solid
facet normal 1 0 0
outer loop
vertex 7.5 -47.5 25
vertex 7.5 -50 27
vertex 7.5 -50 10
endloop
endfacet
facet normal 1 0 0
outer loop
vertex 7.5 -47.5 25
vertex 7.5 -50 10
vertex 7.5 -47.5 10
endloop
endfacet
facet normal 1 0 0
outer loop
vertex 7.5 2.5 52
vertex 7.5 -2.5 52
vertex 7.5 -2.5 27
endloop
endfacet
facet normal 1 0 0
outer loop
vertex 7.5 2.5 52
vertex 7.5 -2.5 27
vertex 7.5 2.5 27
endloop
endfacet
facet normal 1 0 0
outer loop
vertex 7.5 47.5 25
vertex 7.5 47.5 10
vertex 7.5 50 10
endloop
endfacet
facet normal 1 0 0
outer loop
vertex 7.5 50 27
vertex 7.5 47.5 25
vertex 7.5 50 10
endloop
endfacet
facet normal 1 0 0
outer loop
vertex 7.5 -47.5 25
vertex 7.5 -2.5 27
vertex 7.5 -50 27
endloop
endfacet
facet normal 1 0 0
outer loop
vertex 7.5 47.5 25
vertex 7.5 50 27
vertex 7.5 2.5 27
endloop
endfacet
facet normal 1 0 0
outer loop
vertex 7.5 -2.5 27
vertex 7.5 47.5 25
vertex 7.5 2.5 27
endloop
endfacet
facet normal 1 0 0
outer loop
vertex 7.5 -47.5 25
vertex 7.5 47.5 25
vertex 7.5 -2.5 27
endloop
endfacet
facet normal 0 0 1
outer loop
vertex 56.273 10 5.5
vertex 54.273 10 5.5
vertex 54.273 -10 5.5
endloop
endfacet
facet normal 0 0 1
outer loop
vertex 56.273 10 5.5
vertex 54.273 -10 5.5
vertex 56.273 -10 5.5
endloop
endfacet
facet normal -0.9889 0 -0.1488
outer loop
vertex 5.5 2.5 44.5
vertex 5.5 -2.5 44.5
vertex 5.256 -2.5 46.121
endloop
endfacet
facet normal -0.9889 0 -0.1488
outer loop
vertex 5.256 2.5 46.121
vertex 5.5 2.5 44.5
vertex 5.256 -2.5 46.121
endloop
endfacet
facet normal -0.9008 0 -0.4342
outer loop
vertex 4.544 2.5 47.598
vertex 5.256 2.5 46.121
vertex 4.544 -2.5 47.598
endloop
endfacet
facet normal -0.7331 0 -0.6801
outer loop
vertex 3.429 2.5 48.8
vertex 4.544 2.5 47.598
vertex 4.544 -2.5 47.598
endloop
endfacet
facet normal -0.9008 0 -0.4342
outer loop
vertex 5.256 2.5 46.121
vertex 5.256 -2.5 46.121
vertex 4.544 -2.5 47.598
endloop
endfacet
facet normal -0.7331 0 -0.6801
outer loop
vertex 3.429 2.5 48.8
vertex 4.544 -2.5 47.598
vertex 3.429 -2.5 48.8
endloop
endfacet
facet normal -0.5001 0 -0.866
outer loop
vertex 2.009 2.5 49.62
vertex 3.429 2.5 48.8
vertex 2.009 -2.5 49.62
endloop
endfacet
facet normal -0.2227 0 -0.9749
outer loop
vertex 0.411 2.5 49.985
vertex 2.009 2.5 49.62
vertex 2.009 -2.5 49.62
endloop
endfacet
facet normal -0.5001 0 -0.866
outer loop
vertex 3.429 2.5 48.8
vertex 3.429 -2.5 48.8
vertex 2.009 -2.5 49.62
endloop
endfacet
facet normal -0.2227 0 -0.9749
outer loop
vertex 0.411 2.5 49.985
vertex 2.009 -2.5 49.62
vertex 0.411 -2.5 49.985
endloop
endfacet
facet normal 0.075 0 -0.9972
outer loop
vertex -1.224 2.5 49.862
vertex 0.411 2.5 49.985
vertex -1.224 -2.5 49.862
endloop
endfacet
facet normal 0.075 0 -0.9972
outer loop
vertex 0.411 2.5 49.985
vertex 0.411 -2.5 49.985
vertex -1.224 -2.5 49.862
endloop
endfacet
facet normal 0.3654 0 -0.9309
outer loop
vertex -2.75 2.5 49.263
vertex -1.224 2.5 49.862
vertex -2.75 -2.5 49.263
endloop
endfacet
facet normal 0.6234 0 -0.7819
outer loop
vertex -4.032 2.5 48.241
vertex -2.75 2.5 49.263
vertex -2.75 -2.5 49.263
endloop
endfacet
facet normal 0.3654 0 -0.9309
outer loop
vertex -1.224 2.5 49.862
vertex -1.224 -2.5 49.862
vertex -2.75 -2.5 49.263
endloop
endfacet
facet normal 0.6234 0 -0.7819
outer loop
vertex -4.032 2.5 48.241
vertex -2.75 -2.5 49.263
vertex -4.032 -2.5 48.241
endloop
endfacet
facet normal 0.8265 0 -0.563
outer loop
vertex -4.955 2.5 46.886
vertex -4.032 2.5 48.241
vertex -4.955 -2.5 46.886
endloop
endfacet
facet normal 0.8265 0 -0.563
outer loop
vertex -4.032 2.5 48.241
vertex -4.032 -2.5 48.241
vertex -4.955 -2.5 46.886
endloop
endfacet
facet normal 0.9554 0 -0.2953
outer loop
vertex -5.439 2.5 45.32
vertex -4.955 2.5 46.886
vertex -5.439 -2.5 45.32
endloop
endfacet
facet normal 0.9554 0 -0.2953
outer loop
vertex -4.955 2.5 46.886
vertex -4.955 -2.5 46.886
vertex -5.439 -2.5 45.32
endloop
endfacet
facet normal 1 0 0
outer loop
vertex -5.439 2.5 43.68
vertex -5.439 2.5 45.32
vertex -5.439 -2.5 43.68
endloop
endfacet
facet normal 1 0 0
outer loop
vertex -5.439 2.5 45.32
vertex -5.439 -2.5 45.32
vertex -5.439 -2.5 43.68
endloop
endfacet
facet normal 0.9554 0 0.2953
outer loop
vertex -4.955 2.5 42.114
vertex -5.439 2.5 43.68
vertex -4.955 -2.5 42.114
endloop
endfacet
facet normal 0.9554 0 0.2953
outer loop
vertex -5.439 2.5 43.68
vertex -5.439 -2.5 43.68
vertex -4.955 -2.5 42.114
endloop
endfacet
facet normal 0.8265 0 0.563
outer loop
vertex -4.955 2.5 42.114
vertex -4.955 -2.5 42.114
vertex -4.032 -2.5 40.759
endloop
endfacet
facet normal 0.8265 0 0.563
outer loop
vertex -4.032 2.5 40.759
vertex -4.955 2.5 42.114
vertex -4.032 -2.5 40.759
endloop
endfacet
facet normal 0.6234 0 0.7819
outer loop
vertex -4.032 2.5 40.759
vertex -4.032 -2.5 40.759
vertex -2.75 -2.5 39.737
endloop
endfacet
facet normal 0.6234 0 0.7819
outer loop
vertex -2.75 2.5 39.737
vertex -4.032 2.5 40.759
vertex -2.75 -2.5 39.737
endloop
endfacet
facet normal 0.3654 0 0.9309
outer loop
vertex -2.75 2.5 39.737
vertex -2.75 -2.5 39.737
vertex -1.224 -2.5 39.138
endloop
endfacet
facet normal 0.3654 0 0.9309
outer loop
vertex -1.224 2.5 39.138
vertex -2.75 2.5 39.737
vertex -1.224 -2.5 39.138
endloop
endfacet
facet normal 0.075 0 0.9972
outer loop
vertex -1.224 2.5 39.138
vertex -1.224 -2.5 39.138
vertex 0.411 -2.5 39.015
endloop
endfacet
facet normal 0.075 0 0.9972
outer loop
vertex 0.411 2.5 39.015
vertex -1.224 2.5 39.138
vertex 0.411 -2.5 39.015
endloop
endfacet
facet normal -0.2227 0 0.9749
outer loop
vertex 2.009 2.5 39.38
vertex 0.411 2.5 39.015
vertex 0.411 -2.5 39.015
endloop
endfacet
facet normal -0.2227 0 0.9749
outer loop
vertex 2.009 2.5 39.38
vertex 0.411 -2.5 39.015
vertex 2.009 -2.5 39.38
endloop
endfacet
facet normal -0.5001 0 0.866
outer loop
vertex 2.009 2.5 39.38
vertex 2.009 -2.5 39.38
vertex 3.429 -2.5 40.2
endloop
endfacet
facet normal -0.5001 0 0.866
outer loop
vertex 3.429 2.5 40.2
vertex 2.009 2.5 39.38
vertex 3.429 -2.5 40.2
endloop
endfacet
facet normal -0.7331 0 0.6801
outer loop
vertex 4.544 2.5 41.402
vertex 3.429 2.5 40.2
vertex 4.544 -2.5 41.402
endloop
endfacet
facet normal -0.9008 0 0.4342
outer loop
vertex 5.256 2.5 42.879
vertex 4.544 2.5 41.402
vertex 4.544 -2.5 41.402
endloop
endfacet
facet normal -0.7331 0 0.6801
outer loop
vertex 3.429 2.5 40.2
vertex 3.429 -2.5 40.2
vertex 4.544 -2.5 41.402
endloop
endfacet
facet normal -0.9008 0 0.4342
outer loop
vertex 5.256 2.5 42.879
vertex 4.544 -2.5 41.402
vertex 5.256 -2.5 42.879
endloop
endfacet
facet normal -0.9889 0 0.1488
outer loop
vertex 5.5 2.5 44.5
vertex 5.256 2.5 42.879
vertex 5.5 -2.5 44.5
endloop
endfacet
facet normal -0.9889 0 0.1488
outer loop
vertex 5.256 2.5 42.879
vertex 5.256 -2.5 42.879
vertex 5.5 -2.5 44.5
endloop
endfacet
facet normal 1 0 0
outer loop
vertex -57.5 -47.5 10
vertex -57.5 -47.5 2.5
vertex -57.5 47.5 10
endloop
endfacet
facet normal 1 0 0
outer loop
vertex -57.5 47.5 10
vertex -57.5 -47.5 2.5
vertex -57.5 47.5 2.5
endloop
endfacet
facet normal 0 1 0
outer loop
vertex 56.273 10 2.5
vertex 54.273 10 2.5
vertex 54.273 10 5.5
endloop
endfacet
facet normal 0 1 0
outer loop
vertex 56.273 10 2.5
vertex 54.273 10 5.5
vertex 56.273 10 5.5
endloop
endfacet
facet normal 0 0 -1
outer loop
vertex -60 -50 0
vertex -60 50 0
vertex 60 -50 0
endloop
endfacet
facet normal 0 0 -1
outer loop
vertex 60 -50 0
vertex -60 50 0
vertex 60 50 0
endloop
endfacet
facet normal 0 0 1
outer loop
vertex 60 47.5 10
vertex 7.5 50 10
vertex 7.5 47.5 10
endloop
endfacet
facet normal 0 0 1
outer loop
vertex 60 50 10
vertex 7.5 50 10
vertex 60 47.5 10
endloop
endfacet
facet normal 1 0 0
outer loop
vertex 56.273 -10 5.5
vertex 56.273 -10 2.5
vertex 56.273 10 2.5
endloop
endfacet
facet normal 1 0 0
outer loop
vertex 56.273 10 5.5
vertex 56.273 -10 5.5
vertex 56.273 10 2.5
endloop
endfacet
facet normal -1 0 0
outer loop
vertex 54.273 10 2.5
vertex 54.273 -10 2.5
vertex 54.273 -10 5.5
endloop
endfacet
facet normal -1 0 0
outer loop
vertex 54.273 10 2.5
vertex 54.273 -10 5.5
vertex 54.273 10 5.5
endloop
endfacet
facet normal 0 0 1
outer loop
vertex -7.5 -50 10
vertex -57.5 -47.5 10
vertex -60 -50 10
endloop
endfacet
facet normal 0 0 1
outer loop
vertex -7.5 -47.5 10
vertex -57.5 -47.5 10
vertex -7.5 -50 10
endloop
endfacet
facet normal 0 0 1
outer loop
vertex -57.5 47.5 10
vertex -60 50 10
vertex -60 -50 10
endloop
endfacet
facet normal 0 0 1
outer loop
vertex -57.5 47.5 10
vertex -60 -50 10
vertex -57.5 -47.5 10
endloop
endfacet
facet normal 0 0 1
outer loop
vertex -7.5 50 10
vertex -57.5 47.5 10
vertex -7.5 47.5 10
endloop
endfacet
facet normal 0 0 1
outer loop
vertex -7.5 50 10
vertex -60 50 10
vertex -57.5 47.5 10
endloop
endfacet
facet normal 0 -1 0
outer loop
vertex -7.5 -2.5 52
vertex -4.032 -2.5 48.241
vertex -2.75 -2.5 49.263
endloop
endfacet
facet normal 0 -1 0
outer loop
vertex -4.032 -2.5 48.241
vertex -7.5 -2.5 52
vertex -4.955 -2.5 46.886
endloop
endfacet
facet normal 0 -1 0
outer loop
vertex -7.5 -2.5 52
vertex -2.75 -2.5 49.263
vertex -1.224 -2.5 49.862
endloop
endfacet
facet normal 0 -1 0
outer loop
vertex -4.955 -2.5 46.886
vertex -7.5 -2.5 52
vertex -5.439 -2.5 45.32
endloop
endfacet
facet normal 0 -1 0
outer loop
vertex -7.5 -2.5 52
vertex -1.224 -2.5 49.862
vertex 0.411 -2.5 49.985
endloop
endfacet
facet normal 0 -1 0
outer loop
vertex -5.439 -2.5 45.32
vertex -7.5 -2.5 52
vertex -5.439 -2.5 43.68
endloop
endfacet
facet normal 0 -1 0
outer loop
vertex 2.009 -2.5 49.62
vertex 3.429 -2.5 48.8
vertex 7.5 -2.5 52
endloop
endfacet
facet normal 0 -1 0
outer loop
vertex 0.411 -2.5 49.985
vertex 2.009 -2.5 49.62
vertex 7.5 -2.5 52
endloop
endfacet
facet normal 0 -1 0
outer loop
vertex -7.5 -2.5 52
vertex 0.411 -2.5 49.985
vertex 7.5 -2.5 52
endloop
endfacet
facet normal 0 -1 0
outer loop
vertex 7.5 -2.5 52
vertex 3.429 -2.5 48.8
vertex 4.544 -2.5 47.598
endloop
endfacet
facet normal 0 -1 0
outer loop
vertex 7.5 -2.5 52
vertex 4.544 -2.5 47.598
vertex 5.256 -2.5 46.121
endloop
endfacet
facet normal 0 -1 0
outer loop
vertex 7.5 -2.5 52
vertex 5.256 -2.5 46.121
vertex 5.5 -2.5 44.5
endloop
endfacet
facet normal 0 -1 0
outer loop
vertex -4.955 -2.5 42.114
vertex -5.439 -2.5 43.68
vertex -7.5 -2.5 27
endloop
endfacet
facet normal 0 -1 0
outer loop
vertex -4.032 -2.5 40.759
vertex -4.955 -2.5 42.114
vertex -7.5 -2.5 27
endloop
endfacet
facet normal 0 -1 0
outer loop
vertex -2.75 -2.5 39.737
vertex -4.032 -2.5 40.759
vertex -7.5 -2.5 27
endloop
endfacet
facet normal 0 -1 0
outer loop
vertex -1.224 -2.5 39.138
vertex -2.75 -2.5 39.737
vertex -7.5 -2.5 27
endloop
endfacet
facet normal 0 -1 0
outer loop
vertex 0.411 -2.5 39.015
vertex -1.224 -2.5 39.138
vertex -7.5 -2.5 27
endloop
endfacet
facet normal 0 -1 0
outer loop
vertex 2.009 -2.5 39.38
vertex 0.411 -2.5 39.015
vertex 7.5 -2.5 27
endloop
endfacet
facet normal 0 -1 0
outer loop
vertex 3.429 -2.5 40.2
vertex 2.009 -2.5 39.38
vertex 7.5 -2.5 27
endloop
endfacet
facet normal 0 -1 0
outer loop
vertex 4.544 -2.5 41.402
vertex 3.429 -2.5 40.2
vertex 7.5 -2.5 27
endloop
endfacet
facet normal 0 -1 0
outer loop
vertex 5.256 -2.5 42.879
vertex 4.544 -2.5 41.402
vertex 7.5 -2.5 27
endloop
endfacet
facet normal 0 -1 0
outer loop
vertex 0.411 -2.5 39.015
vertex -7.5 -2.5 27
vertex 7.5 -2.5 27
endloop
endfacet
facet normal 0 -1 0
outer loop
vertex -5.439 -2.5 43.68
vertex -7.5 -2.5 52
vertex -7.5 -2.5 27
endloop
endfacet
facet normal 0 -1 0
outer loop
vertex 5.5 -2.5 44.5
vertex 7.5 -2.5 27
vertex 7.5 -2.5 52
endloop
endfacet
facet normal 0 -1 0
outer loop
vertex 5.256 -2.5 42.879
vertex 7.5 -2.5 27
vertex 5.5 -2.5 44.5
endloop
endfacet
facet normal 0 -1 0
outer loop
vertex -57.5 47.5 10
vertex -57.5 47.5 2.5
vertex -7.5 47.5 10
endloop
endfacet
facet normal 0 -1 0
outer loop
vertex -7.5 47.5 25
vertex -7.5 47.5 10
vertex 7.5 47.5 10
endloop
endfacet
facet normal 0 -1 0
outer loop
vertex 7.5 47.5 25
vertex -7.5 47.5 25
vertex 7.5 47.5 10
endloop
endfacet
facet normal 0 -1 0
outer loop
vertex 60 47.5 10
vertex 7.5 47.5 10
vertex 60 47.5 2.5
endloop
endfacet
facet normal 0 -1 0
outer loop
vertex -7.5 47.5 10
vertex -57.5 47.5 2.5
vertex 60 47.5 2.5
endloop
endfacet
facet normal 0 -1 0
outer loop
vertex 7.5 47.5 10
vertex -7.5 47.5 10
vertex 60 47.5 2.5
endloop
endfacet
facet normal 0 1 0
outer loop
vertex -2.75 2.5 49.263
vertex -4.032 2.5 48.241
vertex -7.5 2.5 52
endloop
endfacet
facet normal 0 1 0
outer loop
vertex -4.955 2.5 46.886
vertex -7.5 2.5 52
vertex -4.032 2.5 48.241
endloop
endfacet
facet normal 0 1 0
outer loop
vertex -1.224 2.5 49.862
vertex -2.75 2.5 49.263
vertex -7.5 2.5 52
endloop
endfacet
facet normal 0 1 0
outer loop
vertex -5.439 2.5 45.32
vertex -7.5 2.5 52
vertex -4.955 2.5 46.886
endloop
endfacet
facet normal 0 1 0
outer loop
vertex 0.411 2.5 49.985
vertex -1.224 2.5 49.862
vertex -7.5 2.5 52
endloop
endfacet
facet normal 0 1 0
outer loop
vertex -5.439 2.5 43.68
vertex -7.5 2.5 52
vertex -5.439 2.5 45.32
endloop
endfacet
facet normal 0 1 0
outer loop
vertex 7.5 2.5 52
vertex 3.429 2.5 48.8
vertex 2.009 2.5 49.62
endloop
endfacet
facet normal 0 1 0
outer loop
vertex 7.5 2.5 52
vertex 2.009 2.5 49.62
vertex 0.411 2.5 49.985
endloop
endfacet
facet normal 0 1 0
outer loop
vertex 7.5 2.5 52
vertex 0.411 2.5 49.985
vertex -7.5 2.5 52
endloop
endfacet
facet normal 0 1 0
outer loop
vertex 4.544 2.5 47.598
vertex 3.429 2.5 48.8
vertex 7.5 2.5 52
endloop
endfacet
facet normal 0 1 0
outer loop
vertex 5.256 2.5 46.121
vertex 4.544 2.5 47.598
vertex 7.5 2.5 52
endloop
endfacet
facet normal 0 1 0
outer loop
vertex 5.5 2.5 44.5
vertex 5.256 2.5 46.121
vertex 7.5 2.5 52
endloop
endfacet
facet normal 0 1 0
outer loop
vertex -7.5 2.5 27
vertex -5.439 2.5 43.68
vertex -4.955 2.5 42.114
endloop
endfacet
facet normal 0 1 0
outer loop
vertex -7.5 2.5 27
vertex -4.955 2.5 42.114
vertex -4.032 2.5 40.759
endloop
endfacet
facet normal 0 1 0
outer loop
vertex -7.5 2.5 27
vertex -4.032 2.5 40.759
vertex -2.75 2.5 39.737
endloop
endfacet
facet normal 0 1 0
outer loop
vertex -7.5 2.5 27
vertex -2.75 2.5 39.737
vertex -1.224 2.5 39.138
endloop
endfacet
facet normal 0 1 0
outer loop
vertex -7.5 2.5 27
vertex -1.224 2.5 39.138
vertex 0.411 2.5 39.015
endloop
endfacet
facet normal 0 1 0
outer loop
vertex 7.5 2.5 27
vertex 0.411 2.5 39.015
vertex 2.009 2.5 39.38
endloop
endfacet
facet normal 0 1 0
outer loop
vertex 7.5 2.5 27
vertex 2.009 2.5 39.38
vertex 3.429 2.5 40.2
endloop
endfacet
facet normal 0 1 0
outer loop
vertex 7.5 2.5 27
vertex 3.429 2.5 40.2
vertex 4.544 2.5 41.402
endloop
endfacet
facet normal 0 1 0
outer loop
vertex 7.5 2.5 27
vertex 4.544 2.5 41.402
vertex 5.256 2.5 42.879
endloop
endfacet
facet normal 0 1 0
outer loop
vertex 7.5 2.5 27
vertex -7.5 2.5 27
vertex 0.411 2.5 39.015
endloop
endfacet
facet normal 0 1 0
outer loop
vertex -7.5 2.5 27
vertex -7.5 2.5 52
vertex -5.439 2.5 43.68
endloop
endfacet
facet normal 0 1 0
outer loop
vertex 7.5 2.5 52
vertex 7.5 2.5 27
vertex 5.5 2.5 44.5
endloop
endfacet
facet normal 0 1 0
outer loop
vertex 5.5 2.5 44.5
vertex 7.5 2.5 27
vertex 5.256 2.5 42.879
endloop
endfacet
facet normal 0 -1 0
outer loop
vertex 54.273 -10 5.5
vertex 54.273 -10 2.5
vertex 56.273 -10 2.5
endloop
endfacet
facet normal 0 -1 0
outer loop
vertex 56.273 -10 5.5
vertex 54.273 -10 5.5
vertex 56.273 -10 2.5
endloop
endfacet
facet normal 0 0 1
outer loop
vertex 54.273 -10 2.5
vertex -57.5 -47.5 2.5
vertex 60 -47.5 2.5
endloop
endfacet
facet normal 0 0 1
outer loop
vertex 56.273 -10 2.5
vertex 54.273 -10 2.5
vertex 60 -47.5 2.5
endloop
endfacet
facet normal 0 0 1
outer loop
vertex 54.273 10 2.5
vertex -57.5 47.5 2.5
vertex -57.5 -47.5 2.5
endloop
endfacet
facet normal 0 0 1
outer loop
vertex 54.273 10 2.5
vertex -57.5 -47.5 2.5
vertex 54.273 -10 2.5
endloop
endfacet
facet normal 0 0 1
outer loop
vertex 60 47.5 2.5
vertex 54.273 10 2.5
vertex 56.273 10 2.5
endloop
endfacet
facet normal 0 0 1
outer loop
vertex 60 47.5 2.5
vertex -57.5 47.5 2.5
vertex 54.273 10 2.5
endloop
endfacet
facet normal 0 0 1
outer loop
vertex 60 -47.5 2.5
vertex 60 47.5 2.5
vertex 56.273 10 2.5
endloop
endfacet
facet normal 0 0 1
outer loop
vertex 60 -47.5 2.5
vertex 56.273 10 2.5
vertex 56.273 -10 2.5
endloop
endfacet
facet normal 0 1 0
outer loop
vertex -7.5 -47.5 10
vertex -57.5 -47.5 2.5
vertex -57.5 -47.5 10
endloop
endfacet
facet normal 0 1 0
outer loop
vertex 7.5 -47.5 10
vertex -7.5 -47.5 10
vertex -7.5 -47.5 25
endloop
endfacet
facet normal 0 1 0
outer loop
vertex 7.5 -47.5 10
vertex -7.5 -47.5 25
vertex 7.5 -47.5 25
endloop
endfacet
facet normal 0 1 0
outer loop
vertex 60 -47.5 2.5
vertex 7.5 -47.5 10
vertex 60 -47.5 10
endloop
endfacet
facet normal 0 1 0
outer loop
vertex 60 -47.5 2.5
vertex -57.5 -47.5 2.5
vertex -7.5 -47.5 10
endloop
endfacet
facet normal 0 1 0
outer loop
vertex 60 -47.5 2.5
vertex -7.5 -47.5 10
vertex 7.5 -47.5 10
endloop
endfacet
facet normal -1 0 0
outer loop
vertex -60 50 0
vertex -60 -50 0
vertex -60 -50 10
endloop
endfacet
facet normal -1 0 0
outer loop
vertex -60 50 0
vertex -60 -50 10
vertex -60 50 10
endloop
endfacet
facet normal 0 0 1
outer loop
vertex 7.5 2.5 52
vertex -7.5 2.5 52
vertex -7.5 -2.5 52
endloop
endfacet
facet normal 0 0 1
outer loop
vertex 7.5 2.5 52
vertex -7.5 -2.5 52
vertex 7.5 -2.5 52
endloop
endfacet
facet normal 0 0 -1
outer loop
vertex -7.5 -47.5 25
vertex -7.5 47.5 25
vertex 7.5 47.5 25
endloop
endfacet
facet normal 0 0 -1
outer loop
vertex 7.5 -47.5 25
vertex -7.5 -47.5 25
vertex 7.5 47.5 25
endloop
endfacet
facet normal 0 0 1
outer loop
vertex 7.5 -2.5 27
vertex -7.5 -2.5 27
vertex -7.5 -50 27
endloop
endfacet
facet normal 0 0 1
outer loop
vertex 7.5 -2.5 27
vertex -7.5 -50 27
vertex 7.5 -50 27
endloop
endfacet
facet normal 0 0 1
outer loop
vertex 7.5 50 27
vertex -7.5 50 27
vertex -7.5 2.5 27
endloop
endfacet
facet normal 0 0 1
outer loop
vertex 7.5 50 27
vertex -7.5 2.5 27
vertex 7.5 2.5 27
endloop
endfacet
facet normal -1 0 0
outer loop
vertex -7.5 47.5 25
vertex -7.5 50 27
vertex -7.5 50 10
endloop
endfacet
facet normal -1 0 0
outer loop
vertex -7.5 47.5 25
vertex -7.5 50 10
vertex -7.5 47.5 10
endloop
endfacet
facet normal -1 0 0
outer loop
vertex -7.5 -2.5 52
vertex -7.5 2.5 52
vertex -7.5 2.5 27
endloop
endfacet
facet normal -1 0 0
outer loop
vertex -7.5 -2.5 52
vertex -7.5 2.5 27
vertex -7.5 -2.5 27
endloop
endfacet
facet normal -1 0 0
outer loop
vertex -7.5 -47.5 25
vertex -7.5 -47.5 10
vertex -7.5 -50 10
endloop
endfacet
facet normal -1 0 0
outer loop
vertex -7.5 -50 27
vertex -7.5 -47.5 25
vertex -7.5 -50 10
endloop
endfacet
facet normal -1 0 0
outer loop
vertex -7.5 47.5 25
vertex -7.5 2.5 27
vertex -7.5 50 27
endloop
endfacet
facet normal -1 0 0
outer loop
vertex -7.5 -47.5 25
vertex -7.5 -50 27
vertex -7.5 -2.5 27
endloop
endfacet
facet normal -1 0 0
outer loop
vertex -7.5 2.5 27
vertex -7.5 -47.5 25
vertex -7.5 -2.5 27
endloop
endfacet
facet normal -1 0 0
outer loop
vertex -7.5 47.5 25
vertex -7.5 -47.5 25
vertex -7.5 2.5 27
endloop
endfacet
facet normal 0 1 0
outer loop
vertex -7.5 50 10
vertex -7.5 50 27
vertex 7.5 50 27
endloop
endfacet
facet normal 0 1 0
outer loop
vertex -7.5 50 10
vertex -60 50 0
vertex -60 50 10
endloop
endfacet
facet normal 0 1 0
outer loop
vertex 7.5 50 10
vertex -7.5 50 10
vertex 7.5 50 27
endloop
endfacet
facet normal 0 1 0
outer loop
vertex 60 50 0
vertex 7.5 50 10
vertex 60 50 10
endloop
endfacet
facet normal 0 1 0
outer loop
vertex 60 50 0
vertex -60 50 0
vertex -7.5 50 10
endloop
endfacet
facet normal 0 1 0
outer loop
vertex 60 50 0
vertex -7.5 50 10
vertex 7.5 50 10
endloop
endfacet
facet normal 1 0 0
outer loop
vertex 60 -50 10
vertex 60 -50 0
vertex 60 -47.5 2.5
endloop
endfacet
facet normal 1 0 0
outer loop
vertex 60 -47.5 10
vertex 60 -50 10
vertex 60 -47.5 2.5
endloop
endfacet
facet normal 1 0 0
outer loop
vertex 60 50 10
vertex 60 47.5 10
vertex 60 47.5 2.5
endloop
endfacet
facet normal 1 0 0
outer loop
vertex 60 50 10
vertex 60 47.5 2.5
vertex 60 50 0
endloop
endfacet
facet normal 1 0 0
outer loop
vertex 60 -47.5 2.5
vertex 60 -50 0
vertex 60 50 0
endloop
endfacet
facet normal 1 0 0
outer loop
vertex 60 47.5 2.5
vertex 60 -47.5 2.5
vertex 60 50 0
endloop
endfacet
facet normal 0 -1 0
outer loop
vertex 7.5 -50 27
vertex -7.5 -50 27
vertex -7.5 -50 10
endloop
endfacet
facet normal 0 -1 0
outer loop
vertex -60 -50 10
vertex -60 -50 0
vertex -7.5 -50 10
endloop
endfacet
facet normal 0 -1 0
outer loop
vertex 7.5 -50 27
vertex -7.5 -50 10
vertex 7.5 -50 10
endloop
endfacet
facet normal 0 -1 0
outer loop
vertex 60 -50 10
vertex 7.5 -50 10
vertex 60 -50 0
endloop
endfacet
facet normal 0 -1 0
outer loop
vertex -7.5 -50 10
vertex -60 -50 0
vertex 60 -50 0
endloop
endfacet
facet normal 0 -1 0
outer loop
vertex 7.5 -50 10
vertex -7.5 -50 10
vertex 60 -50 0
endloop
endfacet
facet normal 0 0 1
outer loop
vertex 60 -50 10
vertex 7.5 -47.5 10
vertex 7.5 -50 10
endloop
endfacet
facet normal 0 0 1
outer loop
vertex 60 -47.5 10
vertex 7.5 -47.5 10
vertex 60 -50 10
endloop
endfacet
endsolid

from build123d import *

# Parameters (mm, degrees)
F0_W      = 120
F0_H      = 100
F1_DEPTH  = 10
F2_T      = -2.5
F4_W      = 3
F4_H      = 95
F5_DEPTH  = 10
F6_W      = 15
F6_H      = 2.5
F7_DEPTH  = 15
F8_W      = 15
F8_H      = 2.5
F8_H_2    = 97.5
F9_DEPTH  = 2
F10_W     = 15
F10_H     = 5
F11_DEPTH = 25
F12_R     = 5.5
F13_DEPTH = 5
F4_W_2    = 2
F4_H_2    = 20
F14_DEPTH = 3


with BuildPart() as f1:
    # F0 (on Top) → F1 (new body)
    with BuildSketch(Plane.XY):
        Rectangle(F0_W, F0_H)
    extrude(amount=F1_DEPTH)

    # F2
    f2_openings = [f1.faces().sort_by_distance(p)[0] for p in [
        (0, 0, 10),
    ]]
    offset(amount=F2_T, openings=f2_openings)

    # F4 (on face) → F5 (cut)
    with BuildSketch(Plane.XY.offset(2.5)):
        with Locations((58.746465, 0)):
            Rectangle(F4_W, F4_H)
    extrude(amount=F5_DEPTH, mode=Mode.SUBTRACT)

    # F6 (on face) → F7 (join)
    with BuildSketch(Plane.XY.offset(10)):
        with Locations((0, -48.75)):
            Rectangle(F6_W, F6_H)
        with Locations((0, 48.75)):
            Rectangle(F6_W, F6_H)
    extrude(amount=F7_DEPTH)

    # F8 (on face) → F9 (join)
    with BuildSketch(Plane.XY.offset(25)):
        with Locations((0, -48.75)):
            Rectangle(F8_W, F8_H)
        with Locations((0, 1.25)):
            Rectangle(F8_W, F8_H_2)
    extrude(amount=F9_DEPTH)

    # F10 (on face) → F11 (join)
    with BuildSketch(Plane.XY.offset(27)):
        Rectangle(F10_W, F10_H)
    extrude(amount=F11_DEPTH)

    # F12 (on face) → F13 (cut, through all)
    with BuildSketch(Plane.XZ.offset(2.5)):
        with Locations((0, 44.5)):
            Circle(F12_R)
    extrude(amount=-F13_DEPTH, mode=Mode.SUBTRACT)

    # F4 (on face) → F14 (join)
    with BuildSketch(Plane.XY.offset(2.5)):
        with Locations((55.273231, 0)):
            Rectangle(F4_W_2, F4_H_2)
    extrude(amount=F14_DEPTH)


solid = f1.part
